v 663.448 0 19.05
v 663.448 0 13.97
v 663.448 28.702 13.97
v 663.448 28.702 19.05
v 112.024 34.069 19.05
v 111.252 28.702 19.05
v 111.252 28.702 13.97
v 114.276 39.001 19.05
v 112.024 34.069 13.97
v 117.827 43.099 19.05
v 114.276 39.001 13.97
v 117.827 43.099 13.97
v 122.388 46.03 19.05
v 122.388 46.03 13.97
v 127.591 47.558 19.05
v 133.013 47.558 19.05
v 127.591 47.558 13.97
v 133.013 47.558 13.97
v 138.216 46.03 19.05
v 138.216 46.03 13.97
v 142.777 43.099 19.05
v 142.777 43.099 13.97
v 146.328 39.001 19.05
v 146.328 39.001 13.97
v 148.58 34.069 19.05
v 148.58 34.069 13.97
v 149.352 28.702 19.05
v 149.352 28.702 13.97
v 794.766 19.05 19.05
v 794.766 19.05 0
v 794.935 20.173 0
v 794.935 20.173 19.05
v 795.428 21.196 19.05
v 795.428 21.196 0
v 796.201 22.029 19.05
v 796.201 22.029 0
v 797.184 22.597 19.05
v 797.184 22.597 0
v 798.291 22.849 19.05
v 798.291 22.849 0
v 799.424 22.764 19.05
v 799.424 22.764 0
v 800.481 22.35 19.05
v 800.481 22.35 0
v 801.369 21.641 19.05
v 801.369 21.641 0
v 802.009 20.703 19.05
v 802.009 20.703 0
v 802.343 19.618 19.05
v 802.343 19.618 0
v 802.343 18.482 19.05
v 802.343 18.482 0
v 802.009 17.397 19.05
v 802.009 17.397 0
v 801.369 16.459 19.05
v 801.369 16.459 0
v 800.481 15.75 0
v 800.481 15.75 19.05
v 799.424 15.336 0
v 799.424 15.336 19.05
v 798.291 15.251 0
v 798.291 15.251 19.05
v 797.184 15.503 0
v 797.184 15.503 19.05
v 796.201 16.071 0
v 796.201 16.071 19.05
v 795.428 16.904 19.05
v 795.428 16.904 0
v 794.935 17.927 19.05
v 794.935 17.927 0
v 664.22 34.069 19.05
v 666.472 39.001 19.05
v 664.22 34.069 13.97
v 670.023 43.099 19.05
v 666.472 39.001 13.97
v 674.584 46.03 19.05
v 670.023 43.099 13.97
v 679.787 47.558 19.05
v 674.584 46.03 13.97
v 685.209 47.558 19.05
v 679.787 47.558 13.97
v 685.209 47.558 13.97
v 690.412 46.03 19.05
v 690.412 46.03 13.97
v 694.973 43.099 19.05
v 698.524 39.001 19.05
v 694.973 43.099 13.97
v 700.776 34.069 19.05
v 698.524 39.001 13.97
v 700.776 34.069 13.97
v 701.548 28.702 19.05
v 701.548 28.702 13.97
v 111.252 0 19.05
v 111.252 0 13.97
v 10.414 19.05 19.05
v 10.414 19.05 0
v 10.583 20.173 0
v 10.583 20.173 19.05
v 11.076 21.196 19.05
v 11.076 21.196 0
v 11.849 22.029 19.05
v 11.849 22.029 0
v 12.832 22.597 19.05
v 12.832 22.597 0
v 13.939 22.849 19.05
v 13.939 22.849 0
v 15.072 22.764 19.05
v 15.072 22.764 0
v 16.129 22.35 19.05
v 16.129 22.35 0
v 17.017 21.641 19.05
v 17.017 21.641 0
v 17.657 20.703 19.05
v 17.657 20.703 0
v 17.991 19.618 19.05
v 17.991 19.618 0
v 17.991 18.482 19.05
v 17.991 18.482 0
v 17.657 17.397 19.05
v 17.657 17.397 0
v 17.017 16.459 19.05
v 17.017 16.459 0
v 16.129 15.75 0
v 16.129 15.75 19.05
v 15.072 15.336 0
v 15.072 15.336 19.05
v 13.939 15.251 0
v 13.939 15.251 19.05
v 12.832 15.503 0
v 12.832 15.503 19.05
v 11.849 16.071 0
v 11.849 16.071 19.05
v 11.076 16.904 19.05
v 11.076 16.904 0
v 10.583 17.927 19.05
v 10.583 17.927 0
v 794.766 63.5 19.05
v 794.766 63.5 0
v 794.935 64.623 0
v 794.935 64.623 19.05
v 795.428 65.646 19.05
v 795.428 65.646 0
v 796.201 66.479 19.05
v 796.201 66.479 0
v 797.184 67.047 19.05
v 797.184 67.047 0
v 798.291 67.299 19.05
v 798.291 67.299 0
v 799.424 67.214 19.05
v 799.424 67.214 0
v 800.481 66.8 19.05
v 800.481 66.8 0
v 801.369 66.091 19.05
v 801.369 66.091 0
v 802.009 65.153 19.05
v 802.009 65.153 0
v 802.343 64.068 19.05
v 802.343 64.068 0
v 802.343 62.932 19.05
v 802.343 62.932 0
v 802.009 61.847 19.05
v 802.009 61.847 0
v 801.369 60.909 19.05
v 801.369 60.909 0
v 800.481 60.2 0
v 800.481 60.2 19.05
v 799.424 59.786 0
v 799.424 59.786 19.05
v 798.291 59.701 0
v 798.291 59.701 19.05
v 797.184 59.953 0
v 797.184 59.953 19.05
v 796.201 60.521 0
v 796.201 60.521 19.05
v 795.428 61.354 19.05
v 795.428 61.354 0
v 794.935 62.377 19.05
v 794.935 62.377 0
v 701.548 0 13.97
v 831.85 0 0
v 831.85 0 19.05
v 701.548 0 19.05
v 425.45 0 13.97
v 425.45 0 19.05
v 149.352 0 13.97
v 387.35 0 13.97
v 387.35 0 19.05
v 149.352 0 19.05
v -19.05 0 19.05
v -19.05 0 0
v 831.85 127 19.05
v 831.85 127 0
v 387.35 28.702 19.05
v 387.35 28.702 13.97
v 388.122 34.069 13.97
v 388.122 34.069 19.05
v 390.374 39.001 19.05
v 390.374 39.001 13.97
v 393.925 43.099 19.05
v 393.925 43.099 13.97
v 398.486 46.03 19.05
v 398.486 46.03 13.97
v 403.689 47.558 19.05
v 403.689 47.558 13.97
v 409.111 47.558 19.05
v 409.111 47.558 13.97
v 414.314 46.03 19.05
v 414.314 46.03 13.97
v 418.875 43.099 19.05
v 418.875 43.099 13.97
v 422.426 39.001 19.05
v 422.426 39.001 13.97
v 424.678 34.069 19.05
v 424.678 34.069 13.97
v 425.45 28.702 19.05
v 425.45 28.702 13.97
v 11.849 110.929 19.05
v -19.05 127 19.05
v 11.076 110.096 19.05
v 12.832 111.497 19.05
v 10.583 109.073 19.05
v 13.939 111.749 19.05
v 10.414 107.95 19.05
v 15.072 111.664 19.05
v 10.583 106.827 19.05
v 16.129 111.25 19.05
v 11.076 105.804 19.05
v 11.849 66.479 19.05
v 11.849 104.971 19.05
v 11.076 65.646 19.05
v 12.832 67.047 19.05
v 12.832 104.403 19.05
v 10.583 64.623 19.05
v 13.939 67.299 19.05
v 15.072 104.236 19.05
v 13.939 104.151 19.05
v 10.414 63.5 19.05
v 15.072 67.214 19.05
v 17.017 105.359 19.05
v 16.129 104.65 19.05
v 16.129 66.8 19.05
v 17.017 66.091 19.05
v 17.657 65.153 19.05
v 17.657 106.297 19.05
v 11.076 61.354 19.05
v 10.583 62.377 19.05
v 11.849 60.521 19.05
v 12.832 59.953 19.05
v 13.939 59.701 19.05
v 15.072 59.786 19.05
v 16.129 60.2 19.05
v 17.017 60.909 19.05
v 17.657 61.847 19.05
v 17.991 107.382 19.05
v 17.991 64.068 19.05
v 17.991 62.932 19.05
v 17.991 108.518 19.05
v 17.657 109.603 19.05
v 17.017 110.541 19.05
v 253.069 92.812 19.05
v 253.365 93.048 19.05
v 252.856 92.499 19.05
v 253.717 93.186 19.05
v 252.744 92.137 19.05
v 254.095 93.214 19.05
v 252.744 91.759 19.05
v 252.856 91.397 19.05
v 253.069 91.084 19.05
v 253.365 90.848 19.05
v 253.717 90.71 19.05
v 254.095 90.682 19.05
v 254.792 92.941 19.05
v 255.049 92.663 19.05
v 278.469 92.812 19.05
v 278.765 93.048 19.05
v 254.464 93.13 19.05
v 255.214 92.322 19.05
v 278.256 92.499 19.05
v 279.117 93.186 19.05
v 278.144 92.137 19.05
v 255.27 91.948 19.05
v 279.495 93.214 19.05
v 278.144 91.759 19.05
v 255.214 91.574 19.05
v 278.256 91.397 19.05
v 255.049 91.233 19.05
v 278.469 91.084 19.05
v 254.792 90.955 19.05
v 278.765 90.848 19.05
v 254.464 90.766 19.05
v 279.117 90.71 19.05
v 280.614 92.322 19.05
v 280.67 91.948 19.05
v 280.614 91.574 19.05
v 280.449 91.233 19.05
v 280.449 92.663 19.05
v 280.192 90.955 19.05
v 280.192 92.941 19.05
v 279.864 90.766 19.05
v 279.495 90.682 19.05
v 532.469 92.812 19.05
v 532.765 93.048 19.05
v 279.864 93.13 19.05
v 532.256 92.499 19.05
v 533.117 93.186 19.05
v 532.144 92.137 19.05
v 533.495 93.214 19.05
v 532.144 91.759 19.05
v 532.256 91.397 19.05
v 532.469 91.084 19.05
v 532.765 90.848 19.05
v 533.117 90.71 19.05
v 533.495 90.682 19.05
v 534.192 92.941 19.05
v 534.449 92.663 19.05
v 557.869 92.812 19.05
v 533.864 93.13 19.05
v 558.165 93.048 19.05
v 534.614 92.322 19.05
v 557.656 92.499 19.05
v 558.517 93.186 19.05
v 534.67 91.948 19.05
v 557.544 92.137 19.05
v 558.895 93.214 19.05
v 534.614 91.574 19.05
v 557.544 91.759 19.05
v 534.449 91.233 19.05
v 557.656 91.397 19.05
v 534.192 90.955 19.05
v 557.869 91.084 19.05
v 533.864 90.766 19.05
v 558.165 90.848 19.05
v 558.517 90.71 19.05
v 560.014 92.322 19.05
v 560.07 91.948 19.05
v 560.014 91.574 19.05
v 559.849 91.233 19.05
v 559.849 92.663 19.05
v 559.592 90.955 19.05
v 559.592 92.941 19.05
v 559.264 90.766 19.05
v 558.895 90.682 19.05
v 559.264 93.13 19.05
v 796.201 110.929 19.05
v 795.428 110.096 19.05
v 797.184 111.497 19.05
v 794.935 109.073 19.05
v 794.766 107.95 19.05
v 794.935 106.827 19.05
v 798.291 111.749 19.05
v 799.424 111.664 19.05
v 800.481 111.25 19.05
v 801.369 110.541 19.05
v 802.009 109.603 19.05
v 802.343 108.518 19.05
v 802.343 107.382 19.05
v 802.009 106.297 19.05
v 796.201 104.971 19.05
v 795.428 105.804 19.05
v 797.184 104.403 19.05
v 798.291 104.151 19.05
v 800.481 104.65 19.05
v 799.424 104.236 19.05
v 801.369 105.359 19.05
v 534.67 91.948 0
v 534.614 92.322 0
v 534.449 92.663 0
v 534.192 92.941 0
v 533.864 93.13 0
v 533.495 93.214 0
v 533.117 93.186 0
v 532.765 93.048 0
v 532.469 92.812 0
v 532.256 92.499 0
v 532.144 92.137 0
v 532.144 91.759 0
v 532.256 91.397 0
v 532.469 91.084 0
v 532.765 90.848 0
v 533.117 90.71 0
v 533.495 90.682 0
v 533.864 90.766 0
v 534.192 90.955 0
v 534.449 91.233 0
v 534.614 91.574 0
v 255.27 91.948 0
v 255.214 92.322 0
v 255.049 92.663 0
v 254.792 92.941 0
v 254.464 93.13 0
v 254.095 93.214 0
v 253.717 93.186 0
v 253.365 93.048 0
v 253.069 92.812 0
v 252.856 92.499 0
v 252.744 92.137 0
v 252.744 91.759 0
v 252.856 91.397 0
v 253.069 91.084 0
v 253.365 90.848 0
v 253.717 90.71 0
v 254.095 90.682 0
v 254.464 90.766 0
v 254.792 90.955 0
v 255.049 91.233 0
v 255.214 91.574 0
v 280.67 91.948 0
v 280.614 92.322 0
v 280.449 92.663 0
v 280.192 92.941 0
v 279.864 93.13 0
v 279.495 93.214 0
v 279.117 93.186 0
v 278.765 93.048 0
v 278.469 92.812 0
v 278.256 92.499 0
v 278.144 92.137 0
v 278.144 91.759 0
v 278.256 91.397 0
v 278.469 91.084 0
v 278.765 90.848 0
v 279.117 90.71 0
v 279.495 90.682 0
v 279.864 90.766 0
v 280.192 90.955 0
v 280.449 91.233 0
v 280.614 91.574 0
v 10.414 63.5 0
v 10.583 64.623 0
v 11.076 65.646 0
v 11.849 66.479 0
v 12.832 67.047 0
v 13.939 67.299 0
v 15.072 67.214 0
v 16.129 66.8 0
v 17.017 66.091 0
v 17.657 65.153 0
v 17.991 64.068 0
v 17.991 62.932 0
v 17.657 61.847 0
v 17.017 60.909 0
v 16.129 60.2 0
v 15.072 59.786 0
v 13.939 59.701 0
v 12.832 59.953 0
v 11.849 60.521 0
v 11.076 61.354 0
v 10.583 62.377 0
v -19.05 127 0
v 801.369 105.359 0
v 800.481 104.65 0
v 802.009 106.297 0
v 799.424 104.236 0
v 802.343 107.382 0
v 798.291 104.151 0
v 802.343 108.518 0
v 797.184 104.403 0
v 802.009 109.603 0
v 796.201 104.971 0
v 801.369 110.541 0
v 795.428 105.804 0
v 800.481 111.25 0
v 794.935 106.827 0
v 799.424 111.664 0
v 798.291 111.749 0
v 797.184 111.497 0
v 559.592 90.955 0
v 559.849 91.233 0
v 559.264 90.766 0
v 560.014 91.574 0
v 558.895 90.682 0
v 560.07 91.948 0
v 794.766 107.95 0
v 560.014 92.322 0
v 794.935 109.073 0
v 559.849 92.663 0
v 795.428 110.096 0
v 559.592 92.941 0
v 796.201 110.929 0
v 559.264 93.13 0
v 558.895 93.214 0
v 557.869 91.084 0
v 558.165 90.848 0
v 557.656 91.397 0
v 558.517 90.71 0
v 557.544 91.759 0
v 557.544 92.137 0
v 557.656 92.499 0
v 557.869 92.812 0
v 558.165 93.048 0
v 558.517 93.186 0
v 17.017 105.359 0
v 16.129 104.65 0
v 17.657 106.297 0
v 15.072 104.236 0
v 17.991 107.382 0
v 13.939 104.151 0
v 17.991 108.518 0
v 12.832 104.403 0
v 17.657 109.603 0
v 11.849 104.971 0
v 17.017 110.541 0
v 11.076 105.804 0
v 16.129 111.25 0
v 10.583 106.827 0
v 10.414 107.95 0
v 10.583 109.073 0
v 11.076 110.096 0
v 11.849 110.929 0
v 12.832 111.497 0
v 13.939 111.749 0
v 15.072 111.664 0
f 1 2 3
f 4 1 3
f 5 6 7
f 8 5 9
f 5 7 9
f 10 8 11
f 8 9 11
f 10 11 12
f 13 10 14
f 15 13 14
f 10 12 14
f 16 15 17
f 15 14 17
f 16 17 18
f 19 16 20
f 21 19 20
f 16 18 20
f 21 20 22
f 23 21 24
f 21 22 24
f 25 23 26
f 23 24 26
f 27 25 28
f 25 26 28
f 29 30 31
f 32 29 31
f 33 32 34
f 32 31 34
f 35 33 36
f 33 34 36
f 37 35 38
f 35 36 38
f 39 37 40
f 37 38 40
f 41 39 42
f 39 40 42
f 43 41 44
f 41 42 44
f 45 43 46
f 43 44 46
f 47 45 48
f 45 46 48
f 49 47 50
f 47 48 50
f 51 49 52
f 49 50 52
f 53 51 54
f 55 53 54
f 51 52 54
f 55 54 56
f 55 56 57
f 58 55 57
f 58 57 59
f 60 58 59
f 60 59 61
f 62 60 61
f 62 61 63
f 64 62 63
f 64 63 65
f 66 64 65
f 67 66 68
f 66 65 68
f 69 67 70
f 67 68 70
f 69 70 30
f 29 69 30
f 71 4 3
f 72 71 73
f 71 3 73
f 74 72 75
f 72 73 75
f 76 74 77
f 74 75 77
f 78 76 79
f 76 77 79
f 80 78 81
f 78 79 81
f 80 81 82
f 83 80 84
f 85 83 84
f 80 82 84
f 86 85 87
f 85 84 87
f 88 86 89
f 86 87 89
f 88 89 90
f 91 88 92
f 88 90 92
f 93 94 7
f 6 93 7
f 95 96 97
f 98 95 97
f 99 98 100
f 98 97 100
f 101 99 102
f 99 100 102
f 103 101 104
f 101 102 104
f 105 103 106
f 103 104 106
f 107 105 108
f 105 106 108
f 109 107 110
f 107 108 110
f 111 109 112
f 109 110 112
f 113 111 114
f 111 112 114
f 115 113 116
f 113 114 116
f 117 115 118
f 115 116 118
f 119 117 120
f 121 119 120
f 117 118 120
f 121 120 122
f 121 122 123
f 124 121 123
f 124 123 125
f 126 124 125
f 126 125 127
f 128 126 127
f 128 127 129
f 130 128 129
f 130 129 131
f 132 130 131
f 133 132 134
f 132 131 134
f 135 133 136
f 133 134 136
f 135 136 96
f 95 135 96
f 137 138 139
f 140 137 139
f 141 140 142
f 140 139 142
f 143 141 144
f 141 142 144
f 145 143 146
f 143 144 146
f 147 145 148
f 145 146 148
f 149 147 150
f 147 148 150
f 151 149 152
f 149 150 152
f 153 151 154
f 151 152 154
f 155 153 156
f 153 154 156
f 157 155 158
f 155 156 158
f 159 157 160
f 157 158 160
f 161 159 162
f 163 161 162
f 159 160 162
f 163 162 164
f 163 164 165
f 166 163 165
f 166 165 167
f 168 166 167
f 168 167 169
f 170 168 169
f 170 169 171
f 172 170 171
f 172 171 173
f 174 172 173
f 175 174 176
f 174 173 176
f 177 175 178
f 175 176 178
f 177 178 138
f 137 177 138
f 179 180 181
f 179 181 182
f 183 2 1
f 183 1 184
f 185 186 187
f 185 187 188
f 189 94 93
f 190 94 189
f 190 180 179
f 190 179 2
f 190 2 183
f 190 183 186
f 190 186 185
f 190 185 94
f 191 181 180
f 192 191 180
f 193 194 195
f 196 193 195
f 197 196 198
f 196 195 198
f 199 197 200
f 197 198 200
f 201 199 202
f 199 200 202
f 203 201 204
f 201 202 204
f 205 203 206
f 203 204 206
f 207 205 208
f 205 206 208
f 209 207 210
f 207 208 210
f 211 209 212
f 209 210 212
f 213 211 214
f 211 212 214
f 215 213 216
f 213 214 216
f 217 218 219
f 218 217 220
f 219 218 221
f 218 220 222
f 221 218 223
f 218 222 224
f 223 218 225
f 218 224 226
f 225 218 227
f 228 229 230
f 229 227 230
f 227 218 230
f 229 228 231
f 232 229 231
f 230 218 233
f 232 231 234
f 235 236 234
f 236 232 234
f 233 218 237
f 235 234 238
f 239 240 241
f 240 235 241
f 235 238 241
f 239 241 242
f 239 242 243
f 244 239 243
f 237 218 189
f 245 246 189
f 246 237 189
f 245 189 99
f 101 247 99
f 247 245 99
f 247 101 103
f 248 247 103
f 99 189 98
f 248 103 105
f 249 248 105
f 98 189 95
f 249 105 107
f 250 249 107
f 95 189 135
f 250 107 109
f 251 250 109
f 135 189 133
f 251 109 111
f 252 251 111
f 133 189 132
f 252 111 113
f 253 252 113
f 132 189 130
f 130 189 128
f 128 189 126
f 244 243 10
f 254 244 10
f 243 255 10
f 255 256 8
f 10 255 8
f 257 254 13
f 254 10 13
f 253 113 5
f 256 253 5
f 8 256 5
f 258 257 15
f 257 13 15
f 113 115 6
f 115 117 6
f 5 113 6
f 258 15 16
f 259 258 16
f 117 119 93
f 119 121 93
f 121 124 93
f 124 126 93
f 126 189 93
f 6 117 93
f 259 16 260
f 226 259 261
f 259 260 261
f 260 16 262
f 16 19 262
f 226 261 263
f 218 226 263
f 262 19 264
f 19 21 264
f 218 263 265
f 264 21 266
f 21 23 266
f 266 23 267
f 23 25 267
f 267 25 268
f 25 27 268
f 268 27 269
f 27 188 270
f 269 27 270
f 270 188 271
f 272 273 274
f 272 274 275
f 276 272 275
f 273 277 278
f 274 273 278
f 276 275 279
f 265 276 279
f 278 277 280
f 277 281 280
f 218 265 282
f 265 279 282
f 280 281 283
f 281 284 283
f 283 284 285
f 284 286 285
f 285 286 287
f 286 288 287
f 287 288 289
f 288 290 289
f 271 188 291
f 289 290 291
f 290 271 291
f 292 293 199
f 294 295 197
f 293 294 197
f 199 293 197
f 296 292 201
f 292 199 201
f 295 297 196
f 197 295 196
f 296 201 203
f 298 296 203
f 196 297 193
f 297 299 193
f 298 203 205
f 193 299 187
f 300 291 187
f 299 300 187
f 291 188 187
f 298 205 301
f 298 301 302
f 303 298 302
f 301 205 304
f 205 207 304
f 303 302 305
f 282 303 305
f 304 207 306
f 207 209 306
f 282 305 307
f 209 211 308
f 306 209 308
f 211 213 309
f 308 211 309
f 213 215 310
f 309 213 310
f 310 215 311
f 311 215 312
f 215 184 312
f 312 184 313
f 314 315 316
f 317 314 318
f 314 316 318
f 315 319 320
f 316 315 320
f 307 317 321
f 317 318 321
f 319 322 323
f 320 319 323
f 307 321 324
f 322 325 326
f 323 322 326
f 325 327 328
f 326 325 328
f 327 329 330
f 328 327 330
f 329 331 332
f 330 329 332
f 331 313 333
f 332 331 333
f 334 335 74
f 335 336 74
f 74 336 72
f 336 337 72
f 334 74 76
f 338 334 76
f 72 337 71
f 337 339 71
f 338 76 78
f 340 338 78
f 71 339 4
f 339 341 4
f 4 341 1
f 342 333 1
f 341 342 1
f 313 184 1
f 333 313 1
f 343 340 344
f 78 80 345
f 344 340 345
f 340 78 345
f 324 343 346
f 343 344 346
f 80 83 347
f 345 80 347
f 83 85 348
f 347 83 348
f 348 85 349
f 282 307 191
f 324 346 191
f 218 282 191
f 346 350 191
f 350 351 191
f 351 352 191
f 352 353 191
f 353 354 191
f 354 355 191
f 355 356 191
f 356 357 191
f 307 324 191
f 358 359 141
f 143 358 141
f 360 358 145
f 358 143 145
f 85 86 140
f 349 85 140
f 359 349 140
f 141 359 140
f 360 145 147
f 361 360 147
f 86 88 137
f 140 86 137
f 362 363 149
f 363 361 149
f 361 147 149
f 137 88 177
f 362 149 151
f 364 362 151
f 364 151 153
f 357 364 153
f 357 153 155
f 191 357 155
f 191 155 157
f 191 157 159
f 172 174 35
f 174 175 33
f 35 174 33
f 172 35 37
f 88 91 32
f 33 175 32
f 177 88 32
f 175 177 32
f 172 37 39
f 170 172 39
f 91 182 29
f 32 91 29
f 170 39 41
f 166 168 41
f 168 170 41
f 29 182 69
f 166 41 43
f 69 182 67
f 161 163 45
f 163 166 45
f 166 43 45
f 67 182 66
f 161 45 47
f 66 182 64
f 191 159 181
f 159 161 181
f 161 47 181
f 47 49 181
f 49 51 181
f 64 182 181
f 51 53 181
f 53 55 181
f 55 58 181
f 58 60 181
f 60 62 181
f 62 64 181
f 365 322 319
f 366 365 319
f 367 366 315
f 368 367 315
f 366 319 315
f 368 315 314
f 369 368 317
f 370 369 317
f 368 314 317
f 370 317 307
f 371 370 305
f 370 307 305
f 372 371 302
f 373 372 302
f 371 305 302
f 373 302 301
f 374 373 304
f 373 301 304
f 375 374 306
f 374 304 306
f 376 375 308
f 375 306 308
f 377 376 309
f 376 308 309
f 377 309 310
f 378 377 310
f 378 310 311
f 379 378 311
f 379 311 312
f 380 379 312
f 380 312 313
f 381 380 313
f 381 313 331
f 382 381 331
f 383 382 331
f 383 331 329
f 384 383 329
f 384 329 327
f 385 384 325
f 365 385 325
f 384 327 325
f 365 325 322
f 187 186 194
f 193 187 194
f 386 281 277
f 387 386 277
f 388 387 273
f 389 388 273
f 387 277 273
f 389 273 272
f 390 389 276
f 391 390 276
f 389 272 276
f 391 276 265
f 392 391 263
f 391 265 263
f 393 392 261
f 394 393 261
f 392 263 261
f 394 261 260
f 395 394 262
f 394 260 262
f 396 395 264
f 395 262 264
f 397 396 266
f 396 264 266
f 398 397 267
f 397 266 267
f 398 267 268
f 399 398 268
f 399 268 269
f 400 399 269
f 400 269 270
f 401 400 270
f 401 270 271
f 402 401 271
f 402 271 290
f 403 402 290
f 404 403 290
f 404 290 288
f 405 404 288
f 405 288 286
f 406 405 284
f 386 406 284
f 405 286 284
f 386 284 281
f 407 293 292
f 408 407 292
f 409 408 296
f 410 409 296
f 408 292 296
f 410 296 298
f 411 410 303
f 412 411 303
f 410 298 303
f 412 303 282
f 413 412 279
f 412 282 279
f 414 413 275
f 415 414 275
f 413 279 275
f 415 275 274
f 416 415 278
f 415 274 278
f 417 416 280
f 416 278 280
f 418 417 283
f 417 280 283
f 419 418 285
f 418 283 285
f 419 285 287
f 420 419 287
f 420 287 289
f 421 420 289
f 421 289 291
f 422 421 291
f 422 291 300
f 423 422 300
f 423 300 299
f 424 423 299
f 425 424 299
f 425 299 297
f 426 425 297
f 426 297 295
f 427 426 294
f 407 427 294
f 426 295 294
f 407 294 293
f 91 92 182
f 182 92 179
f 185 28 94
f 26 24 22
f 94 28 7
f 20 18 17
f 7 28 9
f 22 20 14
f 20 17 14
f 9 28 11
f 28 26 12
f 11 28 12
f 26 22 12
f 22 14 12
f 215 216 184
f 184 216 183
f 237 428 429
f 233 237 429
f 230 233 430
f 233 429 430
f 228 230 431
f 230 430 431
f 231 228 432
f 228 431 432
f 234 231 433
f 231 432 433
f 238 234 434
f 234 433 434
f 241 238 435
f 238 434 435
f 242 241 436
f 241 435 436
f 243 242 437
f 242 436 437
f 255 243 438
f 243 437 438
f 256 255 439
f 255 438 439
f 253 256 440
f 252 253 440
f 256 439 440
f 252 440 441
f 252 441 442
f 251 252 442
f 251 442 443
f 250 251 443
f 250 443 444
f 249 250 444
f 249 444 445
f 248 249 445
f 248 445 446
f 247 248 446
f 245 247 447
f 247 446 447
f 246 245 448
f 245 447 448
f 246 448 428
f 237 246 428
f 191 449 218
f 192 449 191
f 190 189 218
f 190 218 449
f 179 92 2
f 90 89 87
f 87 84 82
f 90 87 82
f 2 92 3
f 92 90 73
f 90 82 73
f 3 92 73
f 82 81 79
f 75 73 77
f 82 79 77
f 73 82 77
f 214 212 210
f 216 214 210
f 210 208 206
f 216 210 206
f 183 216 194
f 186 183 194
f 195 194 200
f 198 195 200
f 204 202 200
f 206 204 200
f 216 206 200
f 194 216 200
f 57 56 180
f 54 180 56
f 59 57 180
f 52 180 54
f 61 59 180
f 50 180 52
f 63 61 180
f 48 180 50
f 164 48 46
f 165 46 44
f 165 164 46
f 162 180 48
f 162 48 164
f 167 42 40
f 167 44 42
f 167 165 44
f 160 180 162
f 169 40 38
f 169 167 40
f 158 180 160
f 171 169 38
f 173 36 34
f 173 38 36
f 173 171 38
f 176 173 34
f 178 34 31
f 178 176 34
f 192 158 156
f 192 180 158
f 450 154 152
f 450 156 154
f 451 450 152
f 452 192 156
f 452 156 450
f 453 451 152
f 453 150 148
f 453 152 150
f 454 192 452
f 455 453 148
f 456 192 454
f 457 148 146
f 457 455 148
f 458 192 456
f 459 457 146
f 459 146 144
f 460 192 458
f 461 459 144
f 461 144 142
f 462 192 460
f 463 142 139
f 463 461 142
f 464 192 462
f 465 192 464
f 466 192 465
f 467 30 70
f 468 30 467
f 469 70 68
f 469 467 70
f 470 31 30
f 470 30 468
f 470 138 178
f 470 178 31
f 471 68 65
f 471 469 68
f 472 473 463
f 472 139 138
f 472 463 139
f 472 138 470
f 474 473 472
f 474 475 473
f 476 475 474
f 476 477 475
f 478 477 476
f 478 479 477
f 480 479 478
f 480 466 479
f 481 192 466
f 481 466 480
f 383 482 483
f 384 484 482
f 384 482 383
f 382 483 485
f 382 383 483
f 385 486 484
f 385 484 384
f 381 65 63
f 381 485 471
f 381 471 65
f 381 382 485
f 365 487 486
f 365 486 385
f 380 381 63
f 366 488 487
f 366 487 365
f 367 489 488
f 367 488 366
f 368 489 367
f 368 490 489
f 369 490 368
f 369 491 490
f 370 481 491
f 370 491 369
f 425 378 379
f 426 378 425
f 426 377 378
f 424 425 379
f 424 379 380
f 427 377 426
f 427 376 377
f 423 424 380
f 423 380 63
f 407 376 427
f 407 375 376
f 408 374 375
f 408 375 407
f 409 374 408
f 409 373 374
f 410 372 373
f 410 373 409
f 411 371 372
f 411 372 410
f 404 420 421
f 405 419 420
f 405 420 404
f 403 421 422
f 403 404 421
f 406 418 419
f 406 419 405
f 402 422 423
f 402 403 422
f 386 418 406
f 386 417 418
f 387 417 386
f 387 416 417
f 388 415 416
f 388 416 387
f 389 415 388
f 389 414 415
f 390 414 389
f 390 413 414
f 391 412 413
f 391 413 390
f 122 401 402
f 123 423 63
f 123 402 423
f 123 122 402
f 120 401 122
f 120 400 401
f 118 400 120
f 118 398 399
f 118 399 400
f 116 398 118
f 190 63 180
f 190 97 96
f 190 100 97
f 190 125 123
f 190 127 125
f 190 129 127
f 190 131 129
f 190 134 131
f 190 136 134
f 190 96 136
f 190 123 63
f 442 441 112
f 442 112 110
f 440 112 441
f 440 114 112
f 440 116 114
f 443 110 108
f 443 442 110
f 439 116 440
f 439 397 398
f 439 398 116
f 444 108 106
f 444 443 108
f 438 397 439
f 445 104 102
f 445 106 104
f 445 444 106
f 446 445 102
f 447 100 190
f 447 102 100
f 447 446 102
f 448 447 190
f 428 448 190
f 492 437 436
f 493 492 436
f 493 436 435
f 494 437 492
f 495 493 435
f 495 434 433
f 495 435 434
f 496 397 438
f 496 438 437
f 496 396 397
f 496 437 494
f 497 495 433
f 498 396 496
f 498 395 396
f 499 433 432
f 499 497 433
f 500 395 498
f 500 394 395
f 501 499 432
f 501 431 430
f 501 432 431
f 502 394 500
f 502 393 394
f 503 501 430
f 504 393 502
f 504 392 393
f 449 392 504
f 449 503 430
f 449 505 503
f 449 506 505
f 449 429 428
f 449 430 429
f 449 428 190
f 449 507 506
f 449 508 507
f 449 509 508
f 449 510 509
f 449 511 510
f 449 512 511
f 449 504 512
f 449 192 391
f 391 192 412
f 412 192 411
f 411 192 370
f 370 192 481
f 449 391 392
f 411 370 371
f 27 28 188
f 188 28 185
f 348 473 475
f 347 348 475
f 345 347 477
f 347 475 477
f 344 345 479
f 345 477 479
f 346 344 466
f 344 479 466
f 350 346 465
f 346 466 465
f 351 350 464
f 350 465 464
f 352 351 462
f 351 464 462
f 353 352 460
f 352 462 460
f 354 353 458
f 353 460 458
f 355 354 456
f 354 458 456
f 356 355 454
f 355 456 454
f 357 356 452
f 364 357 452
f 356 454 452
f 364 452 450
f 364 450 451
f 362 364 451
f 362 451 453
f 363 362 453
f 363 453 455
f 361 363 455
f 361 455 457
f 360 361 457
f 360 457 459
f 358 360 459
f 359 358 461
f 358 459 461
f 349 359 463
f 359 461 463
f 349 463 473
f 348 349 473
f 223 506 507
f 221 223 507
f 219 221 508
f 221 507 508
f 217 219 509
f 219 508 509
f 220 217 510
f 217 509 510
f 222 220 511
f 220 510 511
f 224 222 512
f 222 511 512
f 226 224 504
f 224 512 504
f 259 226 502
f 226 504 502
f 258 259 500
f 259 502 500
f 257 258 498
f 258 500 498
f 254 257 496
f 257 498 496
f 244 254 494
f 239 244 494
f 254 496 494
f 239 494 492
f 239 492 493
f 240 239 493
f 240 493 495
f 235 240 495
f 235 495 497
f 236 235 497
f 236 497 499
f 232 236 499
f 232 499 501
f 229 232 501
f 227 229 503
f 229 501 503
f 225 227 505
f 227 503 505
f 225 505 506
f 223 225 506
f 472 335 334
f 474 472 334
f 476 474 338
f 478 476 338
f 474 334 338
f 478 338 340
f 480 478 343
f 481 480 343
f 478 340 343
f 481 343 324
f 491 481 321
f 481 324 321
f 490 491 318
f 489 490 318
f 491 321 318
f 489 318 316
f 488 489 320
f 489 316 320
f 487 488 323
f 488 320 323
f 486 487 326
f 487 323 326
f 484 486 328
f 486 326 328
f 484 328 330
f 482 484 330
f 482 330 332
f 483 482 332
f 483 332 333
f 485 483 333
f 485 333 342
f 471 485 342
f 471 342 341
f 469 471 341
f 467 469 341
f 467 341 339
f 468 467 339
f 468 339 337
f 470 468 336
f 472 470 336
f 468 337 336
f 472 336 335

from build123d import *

# Parameters (mm, degrees)
SKETCH1_W           = 812.8
SKETCH1_H           = 19.05
SKETCH1_W_2         = 19.05
BOSS_EXTRUDE2_DEPTH = 127
SKETCH2_R           = 3.81
CUT_EXTRUDE1_DEPTH  = 19.05
SKETCH3_R           = 19.05
CUT_EXTRUDE2_DEPTH  = 19.05
BOSS_EXTRUDE3_DEPTH = 13.97
SKETCH5_R           = 1.27
CUT_EXTRUDE3_DEPTH  = 19.05


with BuildPart() as part:
    # Sketch1 → Boss-Extrude2 (new body)
    with BuildSketch(Plane(origin=(0, 0, 0), x_dir=(1, 0, 0), z_dir=(0, 1, 0))):
        with Locations((406.4, -9.525)):
            Rectangle(SKETCH1_W, SKETCH1_H)
        with Locations((822.325, -9.525)):
            Rectangle(SKETCH1_W_2, SKETCH1_H)
        with Locations((-9.525, -9.525)):
            Rectangle(SKETCH1_W_2, SKETCH1_H)
    extrude(amount=BOSS_EXTRUDE2_DEPTH)

    # Sketch2 → Cut-Extrude1 (cut)
    with BuildSketch(Plane(origin=(0, 0, 0), x_dir=(-1, 0, 0), z_dir=(0, 0, -1))):
        with Locations((-14.224, 107.95)):
            Circle(SKETCH2_R)
        with Locations((-14.224, 63.5)):
            Circle(SKETCH2_R)
        with Locations((-14.224, 19.05)):
            Circle(SKETCH2_R)
        with Locations((-798.576, 19.05)):
            Circle(SKETCH2_R)
        with Locations((-798.576, 107.95)):
            Circle(SKETCH2_R)
        with Locations((-798.576, 63.5)):
            Circle(SKETCH2_R)
    extrude(amount=-CUT_EXTRUDE1_DEPTH, mode=Mode.SUBTRACT)

    # Sketch3 → Cut-Extrude2 (cut)
    with BuildSketch(Plane(origin=(0, 0, 0), x_dir=(-1, 0, 0), z_dir=(0, 0, -1))):
        with BuildLine():
            ThreePointArc((-663.448, 28.702), (-682.498, 9.652), (-701.548, 28.702))
            Line((-701.548, 28.702), (-701.548, 0))
            Line((-701.548, 0), (-663.448, 0))
            Line((-663.448, 0), (-663.448, 28.702))
        make_face()
        with Locations((-682.498, 28.702)):
            Circle(SKETCH3_R)
        with Locations((-406.4, 28.702)):
            Circle(SKETCH3_R)
        with BuildLine():
            Line((-425.45, 28.702), (-425.45, 0))
            Line((-425.45, 0), (-387.35, 0))
            Line((-387.35, 0), (-387.35, 28.702))
            ThreePointArc((-387.35, 28.702), (-406.4, 9.652), (-425.45, 28.702))
        make_face()
        with BuildLine():
            Line((-149.352, 28.702), (-149.352, 0))
            Line((-149.352, 0), (-111.252, 0))
            Line((-111.252, 0), (-111.252, 28.702))
            ThreePointArc((-111.252, 28.702), (-130.302, 9.652), (-149.352, 28.702))
        make_face()
        with Locations((-130.302, 28.702)):
            Circle(SKETCH3_R)
    extrude(amount=-CUT_EXTRUDE2_DEPTH, mode=Mode.SUBTRACT)

    # Sketch4 → Boss-Extrude3 (add)
    with BuildSketch(Plane(origin=(0, 0, 0), x_dir=(-1, 0, 0), z_dir=(0, 0, -1))):
        with BuildLine():
            ThreePointArc((-387.35, 28.702), (-406.4, 9.652), (-425.45, 28.702))
            Line((-425.45, 28.702), (-425.45, 0))
            Line((-425.45, 0), (-387.35, 0))
            Line((-387.35, 0), (-387.35, 28.702))
        make_face()
        with BuildLine():
            ThreePointArc((-387.35, 28.702), (-406.4, 47.752), (-425.45, 28.702))
            ThreePointArc((-425.45, 28.702), (-406.4, 9.652), (-387.35, 28.702))
        make_face()
        with BuildLine():
            Line((-111.252, 0), (-111.252, 28.702))
            ThreePointArc((-111.252, 28.702), (-130.302, 9.652), (-149.352, 28.702))
            Line((-149.352, 28.702), (-149.352, 0))
            Line((-149.352, 0), (-111.252, 0))
        make_face()
        with BuildLine():
            ThreePointArc((-149.352, 28.702), (-130.302, 9.652), (-111.252, 28.702))
            ThreePointArc((-111.252, 28.702), (-130.302, 47.752), (-149.352, 28.702))
        make_face()
        with BuildLine():
            Line((-663.448, 0), (-663.448, 28.702))
            ThreePointArc((-663.448, 28.702), (-682.498, 9.652), (-701.548, 28.702))
            Line((-701.548, 28.702), (-701.548, 0))
            Line((-701.548, 0), (-663.448, 0))
        make_face()
        with BuildLine():
            ThreePointArc((-701.548, 28.702), (-682.498, 9.652), (-663.448, 28.702))
            ThreePointArc((-663.448, 28.702), (-682.498, 47.752), (-701.548, 28.702))
        make_face()
    extrude(amount=-BOSS_EXTRUDE3_DEPTH)

    # Sketch5 → Cut-Extrude3 (cut)
    with BuildSketch(Plane.XY.offset(19.05)):
        with Locations((254, 91.948)):
            Circle(SKETCH5_R)
        with Locations((279.4, 91.948)):
            Circle(SKETCH5_R)
        with Locations((533.4, 91.948)):
            Circle(SKETCH5_R)
        with Locations((558.8, 91.948)):
            Circle(SKETCH5_R)
    extrude(amount=-CUT_EXTRUDE3_DEPTH, mode=Mode.SUBTRACT)


solid = part.part
